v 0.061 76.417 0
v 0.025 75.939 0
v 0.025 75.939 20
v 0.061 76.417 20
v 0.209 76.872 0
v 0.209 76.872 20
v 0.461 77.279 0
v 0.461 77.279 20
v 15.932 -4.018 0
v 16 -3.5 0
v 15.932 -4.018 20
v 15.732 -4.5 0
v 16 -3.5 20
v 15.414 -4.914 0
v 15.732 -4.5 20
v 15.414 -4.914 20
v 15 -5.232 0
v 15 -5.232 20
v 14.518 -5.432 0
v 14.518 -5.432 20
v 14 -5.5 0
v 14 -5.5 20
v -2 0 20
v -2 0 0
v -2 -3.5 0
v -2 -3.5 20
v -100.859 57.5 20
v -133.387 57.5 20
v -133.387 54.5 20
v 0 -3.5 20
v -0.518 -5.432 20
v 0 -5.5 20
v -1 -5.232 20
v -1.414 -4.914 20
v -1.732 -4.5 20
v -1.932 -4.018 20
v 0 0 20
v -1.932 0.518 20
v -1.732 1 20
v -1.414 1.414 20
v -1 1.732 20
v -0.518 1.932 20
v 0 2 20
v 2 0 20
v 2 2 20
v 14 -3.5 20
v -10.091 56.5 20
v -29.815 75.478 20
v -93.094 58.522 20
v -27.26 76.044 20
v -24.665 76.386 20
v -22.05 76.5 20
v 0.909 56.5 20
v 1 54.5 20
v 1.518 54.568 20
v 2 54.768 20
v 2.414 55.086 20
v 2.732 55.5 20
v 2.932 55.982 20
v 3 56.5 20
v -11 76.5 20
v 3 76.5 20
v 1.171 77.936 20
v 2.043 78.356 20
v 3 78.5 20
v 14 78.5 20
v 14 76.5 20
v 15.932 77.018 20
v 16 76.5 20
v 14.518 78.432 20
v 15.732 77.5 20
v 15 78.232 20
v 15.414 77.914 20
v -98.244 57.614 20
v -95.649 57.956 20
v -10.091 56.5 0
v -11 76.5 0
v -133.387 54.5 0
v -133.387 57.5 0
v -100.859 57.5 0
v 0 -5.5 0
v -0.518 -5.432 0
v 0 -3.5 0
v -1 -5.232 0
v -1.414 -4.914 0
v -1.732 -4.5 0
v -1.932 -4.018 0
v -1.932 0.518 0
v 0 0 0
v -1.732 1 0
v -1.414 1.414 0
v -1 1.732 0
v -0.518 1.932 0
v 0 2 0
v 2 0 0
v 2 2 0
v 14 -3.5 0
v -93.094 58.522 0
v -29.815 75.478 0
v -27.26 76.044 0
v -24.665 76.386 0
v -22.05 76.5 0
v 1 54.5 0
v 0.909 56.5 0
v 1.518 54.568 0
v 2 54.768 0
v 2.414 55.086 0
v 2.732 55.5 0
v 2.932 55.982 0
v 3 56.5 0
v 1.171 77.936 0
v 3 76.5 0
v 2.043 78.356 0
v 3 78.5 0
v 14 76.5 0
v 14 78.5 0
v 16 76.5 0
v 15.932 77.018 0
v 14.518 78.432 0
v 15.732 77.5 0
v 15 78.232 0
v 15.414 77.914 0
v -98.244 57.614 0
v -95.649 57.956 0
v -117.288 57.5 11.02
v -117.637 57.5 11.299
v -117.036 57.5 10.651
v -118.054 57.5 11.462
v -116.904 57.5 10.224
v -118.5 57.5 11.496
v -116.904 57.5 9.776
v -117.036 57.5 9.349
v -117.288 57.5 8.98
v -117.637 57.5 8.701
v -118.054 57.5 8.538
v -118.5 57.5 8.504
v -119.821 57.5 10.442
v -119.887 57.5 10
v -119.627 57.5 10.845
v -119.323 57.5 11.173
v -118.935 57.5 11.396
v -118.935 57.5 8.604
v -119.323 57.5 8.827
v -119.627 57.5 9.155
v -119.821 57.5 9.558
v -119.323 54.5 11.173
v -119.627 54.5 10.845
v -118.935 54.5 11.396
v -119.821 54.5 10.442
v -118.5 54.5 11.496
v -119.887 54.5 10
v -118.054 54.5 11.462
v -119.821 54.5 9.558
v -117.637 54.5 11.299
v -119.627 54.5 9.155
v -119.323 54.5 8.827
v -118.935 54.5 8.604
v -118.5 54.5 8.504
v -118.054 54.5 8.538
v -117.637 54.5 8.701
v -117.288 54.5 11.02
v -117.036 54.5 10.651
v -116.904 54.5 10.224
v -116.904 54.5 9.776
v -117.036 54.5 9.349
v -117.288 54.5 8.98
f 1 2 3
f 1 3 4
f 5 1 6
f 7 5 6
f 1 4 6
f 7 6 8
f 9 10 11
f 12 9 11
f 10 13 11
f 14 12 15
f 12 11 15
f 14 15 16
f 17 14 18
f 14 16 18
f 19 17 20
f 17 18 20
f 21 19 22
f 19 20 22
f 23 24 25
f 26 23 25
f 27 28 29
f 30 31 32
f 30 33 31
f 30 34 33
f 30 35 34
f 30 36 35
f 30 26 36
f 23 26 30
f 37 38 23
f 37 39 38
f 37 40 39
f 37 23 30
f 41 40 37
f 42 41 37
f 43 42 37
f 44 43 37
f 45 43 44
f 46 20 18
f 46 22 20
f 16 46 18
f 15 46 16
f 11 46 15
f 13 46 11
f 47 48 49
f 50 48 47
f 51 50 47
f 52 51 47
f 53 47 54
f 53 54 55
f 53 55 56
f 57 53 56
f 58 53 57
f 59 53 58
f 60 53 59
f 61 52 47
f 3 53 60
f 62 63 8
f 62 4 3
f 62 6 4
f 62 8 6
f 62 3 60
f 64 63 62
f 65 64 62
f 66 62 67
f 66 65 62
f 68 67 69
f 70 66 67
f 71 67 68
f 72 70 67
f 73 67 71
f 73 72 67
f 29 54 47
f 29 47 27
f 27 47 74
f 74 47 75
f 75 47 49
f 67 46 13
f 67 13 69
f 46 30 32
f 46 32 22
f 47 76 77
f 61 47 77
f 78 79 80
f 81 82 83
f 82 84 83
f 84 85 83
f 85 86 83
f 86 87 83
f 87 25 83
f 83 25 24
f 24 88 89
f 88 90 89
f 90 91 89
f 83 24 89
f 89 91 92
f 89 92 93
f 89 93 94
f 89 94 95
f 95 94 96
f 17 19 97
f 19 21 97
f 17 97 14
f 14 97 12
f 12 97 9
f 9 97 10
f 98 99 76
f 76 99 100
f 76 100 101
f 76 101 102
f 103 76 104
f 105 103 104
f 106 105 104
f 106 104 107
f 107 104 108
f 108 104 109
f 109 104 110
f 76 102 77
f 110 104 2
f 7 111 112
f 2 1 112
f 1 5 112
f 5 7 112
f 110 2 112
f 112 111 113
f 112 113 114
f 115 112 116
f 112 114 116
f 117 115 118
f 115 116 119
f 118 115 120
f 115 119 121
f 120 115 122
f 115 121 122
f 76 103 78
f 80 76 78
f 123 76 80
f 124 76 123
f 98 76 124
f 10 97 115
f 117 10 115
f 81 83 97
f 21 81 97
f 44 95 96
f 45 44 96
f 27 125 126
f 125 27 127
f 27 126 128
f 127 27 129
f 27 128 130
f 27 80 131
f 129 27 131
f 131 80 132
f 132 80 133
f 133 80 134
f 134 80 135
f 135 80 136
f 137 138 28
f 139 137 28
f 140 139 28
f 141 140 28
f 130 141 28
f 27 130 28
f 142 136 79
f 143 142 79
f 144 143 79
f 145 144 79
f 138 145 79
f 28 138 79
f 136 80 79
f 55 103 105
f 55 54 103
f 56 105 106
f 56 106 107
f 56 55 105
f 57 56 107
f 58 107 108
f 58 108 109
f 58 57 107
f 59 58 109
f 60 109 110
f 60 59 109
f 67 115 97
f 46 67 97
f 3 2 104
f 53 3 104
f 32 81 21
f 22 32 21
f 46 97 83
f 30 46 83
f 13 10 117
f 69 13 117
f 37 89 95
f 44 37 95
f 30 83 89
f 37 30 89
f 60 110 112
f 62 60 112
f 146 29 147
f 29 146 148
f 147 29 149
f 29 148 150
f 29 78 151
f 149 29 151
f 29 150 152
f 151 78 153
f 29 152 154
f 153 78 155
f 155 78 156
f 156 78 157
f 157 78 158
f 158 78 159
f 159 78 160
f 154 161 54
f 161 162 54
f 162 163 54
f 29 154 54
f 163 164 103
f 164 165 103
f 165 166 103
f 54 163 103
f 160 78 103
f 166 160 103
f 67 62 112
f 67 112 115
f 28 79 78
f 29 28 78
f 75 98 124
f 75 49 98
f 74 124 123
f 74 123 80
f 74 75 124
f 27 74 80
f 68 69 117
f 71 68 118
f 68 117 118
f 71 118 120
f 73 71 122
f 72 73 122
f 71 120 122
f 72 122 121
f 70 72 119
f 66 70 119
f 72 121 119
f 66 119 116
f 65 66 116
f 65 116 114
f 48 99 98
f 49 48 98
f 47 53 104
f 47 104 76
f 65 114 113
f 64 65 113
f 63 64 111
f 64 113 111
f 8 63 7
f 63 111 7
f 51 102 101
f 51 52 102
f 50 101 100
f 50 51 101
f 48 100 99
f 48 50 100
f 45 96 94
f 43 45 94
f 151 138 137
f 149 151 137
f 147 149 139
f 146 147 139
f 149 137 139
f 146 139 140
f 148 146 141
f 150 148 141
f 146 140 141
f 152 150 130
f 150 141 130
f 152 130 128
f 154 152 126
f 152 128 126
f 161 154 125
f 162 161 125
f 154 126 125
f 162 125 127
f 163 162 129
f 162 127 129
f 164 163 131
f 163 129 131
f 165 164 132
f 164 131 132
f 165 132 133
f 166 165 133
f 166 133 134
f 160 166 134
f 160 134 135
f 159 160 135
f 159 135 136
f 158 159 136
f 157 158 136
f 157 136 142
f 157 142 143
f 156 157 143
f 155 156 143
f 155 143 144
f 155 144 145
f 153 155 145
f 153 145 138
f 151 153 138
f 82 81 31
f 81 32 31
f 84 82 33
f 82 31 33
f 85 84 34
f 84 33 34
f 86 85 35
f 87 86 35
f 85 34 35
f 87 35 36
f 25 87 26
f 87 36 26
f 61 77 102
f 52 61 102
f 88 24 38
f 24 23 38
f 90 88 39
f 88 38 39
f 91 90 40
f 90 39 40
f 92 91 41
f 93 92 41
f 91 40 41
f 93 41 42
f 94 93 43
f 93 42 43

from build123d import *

# Parameters (mm, degrees)
F1_DEPTH = 20
F2_R     = 30
F3_R     = 2
F4_R     = 2
F5_R     = 1.5
F6_DEPTH = 25


with BuildPart() as f1:
    # F0 (on Top) → F1 (new body)
    with BuildSketch(Plane.XY):
        with BuildLine():
            Line((0, -3.5), (0, 0))
            Line((0, 0), (2, 0))
            Line((2, 0), (2, 2))
            Line((2, 2), (-2, 2))
            Line((-2, 2), (-2, 0))
            Line((-2, 0), (-2, -5.5))
            Line((-2, -5.5), (16, -5.5))
            Line((16, -5.5), (16, 54.5))
            Line((16, 54.5), (16, 76.5))
            ThreePointArc((16, 76.5), (15.414214, 77.914214), (14, 78.5))
            Line((14, 78.5), (3, 78.5))
            ThreePointArc((3, 78.5), (1.197224, 77.954163), (0, 76.5))
            Line((0, 76.5), (0.909091, 56.5))
            Line((0.909091, 56.5), (-10.090909, 56.5))
            Line((-10.090909, 56.5), (-11, 76.5))
            Line((-11, 76.5), (-26, 76.5))
            Line((-26, 76.5), (-96.908965, 57.5))
            Line((-96.908965, 57.5), (-133.387446, 57.5))
            Line((-133.387446, 57.5), (-133.387446, 54.5))
            Line((-133.387446, 54.5), (-10, 54.5))
            Line((-10, 54.5), (1, 54.5))
            Line((1, 54.5), (3, 54.5))
            Line((3, 54.5), (3, 76.5))
            Line((3, 76.5), (14, 76.5))
            Line((14, 76.5), (14, 54.5))
            Line((14, 54.5), (14, -3.5))
            Line((14, -3.5), (0, -3.5))
        make_face()
    extrude(amount=F1_DEPTH)

    # F2
    f2_edges = [f1.edges().sort_by_distance(p)[0] for p in [
        (-96.908965, 57.5, 10),
        (-26, 76.5, 10),
    ]]
    fillet(f2_edges, radius=F2_R)

    # F3
    f3_edges = [f1.edges().sort_by_distance(p)[0] for p in [
        (0, 76.5, 10),
    ]]
    fillet(f3_edges, radius=F3_R)

    # F4
    f4_edges = [f1.edges().sort_by_distance(p)[0] for p in [
        (16, -5.5, 10),
        (-2, -5.5, 10),
        (-2, 2, 10),
        (3, 54.5, 10),
    ]]
    fillet(f4_edges, radius=F4_R)

    # F5 (on face) → F6 (cut)
    with BuildSketch(Plane(origin=(0, 57.5, 0), x_dir=(-1, 0, 0), z_dir=(0, 1, 0))):
        with Locations((118.387446, 10)):
            Circle(F5_R)
    extrude(amount=-F6_DEPTH, mode=Mode.SUBTRACT)


solid = f1.part
